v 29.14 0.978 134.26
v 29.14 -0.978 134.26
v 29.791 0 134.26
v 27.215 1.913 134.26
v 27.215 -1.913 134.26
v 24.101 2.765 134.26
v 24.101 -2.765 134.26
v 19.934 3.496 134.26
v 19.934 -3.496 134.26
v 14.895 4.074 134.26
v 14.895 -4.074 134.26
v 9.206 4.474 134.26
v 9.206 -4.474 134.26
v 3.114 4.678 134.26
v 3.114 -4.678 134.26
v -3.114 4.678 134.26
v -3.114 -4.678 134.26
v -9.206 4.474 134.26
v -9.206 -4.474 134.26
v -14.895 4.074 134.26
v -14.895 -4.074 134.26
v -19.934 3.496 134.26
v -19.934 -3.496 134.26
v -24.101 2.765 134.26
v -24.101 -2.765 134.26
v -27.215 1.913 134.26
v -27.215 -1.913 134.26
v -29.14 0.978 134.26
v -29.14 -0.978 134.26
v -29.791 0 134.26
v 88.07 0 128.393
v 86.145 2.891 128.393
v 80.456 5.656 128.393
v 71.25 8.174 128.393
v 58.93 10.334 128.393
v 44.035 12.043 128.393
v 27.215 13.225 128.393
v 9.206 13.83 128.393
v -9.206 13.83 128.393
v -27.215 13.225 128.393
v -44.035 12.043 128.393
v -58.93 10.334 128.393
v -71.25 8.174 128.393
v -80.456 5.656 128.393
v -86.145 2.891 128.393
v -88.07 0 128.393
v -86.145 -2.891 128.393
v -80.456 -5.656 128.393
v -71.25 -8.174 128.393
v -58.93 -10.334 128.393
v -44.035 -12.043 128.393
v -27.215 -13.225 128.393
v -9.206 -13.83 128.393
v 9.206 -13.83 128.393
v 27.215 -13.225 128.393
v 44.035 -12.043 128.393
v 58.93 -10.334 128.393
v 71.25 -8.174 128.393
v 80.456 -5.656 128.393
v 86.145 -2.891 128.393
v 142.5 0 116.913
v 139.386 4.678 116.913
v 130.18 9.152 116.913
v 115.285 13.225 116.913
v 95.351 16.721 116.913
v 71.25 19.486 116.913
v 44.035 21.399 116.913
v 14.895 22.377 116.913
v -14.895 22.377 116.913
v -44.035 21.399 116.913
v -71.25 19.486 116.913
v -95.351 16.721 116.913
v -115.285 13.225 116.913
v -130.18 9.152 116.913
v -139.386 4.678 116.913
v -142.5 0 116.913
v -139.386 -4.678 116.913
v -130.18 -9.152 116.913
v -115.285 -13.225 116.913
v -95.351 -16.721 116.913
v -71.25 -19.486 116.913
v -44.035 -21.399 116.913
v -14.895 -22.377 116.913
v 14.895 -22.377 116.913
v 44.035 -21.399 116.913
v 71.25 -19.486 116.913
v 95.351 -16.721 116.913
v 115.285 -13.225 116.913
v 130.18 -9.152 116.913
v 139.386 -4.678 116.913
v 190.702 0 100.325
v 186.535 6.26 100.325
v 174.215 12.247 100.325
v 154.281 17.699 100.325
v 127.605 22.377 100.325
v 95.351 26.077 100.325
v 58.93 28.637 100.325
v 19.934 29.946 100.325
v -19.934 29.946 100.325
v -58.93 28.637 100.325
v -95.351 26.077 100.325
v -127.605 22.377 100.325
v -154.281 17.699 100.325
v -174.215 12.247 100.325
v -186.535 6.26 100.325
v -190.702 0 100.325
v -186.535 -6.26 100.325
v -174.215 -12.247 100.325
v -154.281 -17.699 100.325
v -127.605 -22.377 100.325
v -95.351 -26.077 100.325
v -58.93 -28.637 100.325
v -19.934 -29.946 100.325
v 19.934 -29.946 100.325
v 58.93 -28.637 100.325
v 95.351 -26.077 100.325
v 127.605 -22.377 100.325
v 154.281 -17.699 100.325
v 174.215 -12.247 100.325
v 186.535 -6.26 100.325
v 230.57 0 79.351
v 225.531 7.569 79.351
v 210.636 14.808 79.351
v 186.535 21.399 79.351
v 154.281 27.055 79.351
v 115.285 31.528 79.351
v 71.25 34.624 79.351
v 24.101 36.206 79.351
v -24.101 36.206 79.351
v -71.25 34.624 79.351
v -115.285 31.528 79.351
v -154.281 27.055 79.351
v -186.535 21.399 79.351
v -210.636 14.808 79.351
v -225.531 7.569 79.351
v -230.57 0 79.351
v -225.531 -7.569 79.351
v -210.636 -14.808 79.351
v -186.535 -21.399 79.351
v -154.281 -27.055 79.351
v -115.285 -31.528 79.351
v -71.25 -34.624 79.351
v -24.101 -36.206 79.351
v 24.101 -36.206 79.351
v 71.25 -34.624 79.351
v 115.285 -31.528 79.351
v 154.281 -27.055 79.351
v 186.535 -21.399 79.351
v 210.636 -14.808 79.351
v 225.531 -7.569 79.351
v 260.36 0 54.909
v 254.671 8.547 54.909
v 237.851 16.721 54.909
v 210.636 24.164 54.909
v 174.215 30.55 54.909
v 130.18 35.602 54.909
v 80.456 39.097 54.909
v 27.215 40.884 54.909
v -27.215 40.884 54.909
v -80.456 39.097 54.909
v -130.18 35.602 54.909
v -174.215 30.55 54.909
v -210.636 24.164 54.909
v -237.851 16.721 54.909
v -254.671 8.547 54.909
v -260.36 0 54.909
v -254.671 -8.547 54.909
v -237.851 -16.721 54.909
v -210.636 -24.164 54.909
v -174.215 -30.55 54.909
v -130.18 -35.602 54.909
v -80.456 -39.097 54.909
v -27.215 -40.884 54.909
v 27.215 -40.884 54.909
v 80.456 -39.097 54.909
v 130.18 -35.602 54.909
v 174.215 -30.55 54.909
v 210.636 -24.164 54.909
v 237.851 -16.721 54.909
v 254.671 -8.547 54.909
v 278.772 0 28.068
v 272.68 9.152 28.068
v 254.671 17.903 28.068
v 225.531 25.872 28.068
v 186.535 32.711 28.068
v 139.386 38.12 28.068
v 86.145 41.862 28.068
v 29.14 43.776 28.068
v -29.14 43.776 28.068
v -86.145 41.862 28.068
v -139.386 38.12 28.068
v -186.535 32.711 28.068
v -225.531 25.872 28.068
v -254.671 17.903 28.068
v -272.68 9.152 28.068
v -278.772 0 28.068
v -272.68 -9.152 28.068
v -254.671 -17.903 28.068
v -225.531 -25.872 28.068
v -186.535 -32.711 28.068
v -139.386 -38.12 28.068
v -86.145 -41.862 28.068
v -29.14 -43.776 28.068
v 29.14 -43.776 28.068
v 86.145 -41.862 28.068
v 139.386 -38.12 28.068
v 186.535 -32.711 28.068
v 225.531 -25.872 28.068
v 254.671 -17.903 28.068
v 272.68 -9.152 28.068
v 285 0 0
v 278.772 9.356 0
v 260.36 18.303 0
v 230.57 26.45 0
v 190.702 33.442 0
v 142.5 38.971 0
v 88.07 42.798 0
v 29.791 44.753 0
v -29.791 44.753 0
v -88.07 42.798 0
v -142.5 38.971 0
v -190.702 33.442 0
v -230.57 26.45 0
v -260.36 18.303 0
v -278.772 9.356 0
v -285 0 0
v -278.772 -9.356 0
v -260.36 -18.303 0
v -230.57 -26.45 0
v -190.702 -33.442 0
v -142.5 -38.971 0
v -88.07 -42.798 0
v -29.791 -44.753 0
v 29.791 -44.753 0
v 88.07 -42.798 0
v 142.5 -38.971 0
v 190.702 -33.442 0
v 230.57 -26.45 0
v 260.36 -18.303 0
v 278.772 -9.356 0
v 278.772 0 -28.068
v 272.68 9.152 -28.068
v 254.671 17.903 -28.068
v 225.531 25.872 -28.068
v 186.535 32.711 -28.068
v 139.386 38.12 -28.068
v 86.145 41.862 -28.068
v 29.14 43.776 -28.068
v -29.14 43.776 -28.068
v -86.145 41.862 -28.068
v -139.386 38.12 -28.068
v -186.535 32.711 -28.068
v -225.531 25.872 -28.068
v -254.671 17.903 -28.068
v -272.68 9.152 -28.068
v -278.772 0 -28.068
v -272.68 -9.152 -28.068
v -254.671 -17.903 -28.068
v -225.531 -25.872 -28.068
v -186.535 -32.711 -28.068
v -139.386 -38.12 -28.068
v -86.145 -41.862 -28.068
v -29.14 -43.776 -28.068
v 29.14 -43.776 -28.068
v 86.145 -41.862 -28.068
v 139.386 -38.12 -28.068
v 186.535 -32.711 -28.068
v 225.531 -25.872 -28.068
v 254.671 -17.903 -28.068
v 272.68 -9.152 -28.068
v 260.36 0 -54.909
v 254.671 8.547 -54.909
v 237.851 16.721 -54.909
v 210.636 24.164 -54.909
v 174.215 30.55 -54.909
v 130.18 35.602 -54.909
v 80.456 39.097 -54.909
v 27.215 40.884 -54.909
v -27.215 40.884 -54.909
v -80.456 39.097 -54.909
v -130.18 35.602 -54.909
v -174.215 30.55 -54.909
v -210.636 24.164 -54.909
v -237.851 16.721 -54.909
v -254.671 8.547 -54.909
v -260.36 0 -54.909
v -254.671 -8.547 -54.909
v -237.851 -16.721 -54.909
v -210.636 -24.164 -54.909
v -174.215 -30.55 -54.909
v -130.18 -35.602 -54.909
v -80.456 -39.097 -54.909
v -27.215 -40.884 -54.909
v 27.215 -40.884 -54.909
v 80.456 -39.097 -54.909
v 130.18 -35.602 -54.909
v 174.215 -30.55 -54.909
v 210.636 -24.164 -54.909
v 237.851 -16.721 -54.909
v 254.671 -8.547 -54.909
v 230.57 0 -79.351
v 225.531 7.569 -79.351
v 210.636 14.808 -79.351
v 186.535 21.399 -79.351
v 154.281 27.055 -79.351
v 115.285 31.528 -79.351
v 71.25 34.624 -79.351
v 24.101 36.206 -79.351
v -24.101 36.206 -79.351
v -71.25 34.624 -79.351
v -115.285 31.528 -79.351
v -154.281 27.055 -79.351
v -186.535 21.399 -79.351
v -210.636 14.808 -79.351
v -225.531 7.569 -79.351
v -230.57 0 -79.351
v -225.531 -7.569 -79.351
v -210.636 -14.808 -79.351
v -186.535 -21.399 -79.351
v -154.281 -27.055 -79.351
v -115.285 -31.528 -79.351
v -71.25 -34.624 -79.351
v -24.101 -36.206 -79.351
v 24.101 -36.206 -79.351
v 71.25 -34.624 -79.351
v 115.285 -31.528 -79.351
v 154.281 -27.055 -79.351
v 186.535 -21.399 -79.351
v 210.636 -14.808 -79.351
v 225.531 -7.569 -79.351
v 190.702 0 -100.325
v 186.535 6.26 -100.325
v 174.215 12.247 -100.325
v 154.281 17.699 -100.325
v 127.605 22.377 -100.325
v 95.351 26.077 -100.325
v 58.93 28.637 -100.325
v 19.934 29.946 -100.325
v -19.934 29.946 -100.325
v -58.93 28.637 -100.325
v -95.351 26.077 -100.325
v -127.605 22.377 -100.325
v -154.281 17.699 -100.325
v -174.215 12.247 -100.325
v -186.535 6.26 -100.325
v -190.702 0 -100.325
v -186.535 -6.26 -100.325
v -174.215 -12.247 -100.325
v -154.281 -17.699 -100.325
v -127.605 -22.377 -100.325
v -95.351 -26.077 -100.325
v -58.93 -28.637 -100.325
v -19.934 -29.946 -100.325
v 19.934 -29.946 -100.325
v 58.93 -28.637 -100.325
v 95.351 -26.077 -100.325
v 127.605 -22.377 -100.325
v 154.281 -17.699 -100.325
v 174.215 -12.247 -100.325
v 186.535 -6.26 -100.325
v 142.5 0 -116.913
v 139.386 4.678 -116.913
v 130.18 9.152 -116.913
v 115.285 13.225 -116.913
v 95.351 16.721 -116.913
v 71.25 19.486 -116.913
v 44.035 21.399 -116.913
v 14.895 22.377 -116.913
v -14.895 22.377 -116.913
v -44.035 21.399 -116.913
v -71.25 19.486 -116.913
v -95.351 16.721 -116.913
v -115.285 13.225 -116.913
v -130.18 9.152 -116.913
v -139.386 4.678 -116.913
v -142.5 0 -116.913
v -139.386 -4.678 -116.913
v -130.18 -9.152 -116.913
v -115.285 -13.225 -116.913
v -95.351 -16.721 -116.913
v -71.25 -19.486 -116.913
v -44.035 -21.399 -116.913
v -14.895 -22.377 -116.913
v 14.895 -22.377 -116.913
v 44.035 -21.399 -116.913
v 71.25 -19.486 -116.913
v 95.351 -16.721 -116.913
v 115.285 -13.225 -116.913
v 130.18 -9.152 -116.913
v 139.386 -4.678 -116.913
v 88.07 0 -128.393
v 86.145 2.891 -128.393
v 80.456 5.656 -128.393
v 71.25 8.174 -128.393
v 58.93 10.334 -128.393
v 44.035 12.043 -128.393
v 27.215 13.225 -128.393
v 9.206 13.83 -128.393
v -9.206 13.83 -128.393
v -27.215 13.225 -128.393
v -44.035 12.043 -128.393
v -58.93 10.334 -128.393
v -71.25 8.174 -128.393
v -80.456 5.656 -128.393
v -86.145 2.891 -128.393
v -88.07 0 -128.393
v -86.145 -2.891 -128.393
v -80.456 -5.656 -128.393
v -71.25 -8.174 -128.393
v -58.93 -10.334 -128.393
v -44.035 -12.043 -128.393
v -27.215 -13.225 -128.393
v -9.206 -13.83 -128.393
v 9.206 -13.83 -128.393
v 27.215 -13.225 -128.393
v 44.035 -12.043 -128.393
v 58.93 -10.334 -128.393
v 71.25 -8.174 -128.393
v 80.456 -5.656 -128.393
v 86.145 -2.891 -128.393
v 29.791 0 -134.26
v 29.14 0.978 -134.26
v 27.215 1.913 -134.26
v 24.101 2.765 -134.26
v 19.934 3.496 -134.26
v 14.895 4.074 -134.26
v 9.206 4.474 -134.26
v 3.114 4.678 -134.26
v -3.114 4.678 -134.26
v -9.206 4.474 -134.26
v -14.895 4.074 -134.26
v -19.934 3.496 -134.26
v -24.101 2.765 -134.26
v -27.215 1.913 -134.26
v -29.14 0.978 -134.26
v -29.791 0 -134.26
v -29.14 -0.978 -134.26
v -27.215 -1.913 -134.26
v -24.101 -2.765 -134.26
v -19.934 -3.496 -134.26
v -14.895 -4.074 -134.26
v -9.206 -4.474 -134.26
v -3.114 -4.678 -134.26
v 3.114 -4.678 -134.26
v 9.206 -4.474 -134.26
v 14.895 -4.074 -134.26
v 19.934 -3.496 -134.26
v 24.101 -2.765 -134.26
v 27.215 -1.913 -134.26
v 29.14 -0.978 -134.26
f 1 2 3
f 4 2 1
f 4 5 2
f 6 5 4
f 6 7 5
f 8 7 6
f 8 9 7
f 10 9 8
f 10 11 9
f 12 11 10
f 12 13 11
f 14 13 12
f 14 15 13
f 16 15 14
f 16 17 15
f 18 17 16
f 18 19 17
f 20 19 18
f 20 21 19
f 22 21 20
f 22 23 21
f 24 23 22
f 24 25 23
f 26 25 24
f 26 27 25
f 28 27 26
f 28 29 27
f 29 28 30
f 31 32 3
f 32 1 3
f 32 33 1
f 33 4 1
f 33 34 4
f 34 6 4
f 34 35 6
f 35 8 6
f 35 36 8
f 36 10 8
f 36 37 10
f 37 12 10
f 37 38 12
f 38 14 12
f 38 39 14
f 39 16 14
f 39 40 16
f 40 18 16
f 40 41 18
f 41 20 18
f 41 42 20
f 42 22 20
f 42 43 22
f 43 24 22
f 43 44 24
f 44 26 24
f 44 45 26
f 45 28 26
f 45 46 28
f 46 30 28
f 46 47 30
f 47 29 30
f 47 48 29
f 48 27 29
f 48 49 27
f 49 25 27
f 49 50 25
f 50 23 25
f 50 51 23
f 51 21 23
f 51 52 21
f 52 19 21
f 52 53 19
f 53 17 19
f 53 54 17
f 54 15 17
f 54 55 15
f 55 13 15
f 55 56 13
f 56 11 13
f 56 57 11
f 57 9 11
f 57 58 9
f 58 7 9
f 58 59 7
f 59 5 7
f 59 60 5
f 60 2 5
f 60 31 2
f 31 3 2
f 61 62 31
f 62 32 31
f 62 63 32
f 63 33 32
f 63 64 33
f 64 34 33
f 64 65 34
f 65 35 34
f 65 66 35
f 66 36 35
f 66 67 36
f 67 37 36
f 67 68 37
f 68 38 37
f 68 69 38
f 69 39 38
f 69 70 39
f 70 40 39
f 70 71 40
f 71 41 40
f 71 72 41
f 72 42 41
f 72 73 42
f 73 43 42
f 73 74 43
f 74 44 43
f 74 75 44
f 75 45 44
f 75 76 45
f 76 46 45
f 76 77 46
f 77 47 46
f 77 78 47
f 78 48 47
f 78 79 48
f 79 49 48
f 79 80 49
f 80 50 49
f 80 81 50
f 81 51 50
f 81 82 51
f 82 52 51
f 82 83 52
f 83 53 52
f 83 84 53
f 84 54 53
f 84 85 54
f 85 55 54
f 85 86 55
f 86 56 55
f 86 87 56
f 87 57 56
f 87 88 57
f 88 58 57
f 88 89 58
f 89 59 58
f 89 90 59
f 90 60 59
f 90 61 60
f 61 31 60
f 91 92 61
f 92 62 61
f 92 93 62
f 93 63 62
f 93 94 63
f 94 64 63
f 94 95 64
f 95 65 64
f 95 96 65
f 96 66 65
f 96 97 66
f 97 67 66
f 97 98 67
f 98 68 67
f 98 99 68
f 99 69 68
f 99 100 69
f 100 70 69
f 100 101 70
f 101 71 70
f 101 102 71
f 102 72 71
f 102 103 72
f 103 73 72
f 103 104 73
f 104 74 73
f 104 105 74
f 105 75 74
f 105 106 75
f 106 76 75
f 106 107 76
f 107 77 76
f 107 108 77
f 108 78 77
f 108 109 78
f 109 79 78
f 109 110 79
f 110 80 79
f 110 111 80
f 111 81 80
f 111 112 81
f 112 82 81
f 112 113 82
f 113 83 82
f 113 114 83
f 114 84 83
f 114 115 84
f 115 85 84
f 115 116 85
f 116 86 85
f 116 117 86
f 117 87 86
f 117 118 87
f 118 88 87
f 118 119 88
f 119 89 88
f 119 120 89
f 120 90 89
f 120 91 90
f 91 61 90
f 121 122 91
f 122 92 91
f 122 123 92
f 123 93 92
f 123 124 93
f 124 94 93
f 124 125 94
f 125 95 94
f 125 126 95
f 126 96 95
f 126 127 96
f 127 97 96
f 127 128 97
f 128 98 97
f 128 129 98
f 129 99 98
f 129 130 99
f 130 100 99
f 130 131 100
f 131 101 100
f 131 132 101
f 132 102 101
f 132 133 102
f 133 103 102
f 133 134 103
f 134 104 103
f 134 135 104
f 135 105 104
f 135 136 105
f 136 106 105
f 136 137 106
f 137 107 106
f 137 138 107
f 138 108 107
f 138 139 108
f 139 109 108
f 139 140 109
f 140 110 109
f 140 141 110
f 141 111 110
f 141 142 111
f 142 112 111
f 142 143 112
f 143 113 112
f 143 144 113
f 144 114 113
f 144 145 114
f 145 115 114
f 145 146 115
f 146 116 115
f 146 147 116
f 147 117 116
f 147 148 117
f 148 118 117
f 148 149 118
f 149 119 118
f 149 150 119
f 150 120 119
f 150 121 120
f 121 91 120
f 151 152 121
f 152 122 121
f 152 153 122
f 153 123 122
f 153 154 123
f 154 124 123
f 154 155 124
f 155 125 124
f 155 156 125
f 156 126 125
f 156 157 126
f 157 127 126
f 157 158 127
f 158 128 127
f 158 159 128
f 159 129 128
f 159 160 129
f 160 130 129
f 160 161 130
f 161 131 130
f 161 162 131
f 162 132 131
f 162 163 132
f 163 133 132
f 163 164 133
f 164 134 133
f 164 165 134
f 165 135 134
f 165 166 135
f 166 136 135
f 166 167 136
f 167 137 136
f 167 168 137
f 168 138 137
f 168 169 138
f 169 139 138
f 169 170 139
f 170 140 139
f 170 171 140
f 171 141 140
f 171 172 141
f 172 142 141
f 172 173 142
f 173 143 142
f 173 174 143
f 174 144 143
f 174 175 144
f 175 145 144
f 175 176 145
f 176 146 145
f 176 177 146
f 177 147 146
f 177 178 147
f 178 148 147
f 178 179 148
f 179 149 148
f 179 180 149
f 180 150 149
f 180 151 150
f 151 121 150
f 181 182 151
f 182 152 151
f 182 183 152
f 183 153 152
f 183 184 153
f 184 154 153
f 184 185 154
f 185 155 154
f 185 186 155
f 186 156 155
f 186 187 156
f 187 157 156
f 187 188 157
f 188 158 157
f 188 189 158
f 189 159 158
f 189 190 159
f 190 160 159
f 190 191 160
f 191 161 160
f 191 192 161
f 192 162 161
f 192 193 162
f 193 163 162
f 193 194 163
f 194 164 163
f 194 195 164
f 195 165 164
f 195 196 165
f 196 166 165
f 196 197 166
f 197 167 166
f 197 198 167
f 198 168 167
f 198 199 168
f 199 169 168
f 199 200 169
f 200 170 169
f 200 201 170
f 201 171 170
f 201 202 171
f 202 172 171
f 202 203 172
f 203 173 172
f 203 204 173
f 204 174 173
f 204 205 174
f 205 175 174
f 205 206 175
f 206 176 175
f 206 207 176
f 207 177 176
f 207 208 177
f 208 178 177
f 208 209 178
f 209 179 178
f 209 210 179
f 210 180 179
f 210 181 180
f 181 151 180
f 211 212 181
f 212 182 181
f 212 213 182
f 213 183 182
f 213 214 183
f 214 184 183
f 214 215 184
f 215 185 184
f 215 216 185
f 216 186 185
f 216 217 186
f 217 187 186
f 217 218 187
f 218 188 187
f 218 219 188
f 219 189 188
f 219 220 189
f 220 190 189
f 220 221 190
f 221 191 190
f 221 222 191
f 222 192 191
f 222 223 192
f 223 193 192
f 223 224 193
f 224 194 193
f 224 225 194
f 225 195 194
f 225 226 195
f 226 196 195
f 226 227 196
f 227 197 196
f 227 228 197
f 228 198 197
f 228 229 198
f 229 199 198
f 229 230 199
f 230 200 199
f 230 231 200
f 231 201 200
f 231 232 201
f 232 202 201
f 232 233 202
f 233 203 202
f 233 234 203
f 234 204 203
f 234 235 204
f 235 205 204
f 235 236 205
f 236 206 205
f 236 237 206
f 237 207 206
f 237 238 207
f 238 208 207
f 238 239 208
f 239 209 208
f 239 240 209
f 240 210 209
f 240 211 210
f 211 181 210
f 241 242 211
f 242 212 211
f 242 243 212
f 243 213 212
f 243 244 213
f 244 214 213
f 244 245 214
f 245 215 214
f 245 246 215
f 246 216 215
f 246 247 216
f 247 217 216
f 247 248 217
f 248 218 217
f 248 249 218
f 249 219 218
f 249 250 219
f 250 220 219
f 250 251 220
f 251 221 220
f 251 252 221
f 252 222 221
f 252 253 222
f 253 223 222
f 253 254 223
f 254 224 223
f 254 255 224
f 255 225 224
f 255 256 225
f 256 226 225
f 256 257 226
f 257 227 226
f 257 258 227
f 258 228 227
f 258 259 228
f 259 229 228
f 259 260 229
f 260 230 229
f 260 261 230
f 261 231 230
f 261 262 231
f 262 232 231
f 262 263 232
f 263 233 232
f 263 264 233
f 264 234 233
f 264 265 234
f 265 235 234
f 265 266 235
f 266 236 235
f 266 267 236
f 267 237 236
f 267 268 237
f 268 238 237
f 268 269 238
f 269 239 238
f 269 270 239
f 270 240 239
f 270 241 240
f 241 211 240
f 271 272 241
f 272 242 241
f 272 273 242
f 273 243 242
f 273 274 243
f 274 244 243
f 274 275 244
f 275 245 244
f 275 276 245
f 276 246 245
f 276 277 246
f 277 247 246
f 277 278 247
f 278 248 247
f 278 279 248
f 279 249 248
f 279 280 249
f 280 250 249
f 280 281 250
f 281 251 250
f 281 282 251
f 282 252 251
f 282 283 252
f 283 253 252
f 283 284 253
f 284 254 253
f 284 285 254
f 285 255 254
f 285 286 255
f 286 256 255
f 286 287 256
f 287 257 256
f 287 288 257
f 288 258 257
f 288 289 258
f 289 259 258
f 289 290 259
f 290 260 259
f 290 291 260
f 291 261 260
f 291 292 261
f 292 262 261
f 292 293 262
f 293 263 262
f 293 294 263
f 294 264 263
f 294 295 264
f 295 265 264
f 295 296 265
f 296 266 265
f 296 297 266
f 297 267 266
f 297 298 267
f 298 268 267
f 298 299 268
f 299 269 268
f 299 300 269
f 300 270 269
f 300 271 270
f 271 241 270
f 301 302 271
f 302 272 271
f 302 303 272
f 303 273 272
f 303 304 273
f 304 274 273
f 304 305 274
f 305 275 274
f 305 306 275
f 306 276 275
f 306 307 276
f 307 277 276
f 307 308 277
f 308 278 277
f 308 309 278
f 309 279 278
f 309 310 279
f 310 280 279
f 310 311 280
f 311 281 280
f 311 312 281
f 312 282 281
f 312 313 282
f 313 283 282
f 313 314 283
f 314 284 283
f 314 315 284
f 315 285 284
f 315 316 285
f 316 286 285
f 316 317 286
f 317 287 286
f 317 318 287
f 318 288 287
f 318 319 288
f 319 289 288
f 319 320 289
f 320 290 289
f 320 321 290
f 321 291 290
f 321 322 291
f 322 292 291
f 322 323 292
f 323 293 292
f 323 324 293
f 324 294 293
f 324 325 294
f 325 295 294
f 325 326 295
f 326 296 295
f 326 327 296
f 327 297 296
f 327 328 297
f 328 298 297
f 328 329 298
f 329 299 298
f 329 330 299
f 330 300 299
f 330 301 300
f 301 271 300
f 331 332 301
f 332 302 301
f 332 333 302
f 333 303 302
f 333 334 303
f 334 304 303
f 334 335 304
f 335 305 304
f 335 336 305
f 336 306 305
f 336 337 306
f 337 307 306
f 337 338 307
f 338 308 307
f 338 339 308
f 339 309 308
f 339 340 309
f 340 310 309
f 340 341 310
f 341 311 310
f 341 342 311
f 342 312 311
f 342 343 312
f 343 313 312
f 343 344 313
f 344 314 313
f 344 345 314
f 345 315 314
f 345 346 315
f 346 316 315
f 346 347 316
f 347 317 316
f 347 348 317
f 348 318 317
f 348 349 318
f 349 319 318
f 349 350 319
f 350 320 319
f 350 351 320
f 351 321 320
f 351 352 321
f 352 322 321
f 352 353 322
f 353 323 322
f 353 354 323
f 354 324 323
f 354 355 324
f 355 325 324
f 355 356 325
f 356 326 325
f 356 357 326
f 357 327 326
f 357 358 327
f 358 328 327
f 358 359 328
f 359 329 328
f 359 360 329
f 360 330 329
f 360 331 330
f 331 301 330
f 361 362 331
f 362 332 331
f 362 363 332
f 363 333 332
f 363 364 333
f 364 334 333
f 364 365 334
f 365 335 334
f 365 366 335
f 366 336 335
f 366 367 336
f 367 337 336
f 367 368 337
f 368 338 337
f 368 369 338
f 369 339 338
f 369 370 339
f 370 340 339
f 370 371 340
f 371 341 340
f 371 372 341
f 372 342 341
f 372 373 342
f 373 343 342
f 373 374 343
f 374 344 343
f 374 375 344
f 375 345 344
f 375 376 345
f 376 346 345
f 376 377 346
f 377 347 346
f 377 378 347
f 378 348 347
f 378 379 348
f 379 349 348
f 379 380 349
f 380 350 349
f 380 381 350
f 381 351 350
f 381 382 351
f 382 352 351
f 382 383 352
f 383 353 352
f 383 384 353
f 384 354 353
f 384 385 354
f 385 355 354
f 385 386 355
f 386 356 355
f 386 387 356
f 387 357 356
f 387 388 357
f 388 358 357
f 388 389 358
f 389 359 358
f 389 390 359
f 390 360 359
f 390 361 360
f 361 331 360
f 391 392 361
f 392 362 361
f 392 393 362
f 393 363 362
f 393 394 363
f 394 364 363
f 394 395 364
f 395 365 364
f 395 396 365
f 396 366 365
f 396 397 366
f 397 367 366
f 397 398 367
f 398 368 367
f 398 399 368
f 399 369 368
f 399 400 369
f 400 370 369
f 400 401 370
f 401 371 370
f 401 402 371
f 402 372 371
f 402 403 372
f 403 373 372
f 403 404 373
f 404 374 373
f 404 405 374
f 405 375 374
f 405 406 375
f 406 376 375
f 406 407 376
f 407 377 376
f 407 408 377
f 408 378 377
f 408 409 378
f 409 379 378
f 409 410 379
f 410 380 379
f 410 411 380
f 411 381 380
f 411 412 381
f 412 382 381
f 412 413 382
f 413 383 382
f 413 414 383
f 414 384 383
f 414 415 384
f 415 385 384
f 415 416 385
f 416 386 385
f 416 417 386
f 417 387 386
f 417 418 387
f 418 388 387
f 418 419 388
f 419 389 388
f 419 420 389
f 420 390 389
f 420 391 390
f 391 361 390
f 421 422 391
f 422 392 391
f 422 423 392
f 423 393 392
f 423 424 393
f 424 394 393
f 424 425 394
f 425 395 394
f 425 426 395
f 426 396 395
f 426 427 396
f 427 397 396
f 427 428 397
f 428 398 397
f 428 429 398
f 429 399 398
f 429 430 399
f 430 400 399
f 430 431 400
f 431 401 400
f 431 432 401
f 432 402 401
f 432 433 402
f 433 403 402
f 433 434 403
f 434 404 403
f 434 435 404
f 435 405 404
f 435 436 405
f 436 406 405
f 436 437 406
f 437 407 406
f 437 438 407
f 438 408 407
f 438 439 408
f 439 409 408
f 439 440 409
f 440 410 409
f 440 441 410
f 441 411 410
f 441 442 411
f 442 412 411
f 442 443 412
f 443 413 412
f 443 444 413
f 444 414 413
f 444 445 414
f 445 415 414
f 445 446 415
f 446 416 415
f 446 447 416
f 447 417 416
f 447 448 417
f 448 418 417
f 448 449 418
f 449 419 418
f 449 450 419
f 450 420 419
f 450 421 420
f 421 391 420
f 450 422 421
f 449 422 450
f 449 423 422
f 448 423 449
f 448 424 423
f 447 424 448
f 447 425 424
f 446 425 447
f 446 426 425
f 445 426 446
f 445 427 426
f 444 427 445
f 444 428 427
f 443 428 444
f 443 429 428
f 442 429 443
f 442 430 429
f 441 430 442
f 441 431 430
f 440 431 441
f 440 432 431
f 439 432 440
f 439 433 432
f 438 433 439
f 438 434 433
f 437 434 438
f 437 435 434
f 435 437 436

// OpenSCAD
// Generated by SolidPython 1.0.1 on 2020-07-29 00:46:53


scale(v = [19, 3, 9]) {
	sphere(r = 15);
}
/***********************************************
*********      SolidPython code:      **********
************************************************
 
# import packages: SolidPython
from solid import *
from solid.utils import *
from itertools import chain, combinations, permutations


class Resize:

    def __init__(self, scad_file):
        self.scad_file = scad_file
        #self.scad_file = import_scad(scad_file)
        # cone/cylinder param:
        self.r1 = 0
        self.r2 = 0
        self.h = 0
        # rectangular prism param:
        self.w = 0
        self.l = 0
        # ellipse param:
        self.r = 0

    # import OpenScad code (file name corresponds to shape)


    # classify shape + parameters
    def assign(self, param1, param2, param3):
        if self.scad_file == 'cone.scad':
            self.r1 = param1
            self.r2 = param2
            self.h = param3
        elif self.scad_file == 'cylinder.scad':
            self.r1 = param1
            self.r2 = param2
            self.h = param3
        elif self.scad_file == 'rectangularPrism.scad':
            self.h = param1
            self.l = param2
            self.w = param3
        else:
            self.r = param1
            self.h = param2

    # resize parameters
    def iterate(self):
        x = range(3, 20, 2)
        i = 1
        if self.scad_file == 'cone.scad':
            tempList = list(permutations(x, 2))
            for temp in tempList:
                param1 = temp[0]
                param2 = temp[1]
                filepath = 'produced_scad_files/' + 'cone' + str(param1) + '_' + str(param2) + '_' + '.scad'
                scad_render_to_file(cylinder(h=param1, r1=param2, r2=0), filepath)

        elif self.scad_file == 'cylinder.scad':
            tempList = list(permutations(x, 3))
            for temp in tempList:
                param1 = temp[0]
                param2 = temp[1]
                filepath = 'produced_scad_files/' + 'cylinder' + str(param1) + '_' + str(param2) + '_' + '.scad'
                scad_render_to_file(cylinder(h=param1, r1=param2, r2=param2), filepath)

        elif self.scad_file == 'rectangularPrism.scad':
            tempList = list(permutations(x, 3))
            for temp in tempList:
                param1 = temp[0]
                param2 = temp[1]
                param3 = temp[2]
                filepath = 'produced_scad_files/' + 'rectangularPrism' + str(param1) + '_' + str(param2) + '_' + str(
                    param3) + '.scad'
                scad_render_to_file(cube(size=(param1, param2, param3)), filepath)

        elif self.scad_file == 'ellipse.scad':
            tempList = list(permutations(x, 4))
            for temp in tempList:
                param1 = temp[0]
                param2 = temp[1]
                param3 = temp[2]
                param4 = temp[3]
                filepath = 'produced_scad_files/' + 'ellipse' + str(param1) + '_' + str(param2) + '_' + str(param3) + '_' + str(param4) + '.scad'
                scad_render_to_file(scale([param1, param2, param3])(sphere(r=param4)), filepath)

    def render_to_scadfile(self):
        scad_render_to_file(scad, 'example.scad') 
 
************************************************/
